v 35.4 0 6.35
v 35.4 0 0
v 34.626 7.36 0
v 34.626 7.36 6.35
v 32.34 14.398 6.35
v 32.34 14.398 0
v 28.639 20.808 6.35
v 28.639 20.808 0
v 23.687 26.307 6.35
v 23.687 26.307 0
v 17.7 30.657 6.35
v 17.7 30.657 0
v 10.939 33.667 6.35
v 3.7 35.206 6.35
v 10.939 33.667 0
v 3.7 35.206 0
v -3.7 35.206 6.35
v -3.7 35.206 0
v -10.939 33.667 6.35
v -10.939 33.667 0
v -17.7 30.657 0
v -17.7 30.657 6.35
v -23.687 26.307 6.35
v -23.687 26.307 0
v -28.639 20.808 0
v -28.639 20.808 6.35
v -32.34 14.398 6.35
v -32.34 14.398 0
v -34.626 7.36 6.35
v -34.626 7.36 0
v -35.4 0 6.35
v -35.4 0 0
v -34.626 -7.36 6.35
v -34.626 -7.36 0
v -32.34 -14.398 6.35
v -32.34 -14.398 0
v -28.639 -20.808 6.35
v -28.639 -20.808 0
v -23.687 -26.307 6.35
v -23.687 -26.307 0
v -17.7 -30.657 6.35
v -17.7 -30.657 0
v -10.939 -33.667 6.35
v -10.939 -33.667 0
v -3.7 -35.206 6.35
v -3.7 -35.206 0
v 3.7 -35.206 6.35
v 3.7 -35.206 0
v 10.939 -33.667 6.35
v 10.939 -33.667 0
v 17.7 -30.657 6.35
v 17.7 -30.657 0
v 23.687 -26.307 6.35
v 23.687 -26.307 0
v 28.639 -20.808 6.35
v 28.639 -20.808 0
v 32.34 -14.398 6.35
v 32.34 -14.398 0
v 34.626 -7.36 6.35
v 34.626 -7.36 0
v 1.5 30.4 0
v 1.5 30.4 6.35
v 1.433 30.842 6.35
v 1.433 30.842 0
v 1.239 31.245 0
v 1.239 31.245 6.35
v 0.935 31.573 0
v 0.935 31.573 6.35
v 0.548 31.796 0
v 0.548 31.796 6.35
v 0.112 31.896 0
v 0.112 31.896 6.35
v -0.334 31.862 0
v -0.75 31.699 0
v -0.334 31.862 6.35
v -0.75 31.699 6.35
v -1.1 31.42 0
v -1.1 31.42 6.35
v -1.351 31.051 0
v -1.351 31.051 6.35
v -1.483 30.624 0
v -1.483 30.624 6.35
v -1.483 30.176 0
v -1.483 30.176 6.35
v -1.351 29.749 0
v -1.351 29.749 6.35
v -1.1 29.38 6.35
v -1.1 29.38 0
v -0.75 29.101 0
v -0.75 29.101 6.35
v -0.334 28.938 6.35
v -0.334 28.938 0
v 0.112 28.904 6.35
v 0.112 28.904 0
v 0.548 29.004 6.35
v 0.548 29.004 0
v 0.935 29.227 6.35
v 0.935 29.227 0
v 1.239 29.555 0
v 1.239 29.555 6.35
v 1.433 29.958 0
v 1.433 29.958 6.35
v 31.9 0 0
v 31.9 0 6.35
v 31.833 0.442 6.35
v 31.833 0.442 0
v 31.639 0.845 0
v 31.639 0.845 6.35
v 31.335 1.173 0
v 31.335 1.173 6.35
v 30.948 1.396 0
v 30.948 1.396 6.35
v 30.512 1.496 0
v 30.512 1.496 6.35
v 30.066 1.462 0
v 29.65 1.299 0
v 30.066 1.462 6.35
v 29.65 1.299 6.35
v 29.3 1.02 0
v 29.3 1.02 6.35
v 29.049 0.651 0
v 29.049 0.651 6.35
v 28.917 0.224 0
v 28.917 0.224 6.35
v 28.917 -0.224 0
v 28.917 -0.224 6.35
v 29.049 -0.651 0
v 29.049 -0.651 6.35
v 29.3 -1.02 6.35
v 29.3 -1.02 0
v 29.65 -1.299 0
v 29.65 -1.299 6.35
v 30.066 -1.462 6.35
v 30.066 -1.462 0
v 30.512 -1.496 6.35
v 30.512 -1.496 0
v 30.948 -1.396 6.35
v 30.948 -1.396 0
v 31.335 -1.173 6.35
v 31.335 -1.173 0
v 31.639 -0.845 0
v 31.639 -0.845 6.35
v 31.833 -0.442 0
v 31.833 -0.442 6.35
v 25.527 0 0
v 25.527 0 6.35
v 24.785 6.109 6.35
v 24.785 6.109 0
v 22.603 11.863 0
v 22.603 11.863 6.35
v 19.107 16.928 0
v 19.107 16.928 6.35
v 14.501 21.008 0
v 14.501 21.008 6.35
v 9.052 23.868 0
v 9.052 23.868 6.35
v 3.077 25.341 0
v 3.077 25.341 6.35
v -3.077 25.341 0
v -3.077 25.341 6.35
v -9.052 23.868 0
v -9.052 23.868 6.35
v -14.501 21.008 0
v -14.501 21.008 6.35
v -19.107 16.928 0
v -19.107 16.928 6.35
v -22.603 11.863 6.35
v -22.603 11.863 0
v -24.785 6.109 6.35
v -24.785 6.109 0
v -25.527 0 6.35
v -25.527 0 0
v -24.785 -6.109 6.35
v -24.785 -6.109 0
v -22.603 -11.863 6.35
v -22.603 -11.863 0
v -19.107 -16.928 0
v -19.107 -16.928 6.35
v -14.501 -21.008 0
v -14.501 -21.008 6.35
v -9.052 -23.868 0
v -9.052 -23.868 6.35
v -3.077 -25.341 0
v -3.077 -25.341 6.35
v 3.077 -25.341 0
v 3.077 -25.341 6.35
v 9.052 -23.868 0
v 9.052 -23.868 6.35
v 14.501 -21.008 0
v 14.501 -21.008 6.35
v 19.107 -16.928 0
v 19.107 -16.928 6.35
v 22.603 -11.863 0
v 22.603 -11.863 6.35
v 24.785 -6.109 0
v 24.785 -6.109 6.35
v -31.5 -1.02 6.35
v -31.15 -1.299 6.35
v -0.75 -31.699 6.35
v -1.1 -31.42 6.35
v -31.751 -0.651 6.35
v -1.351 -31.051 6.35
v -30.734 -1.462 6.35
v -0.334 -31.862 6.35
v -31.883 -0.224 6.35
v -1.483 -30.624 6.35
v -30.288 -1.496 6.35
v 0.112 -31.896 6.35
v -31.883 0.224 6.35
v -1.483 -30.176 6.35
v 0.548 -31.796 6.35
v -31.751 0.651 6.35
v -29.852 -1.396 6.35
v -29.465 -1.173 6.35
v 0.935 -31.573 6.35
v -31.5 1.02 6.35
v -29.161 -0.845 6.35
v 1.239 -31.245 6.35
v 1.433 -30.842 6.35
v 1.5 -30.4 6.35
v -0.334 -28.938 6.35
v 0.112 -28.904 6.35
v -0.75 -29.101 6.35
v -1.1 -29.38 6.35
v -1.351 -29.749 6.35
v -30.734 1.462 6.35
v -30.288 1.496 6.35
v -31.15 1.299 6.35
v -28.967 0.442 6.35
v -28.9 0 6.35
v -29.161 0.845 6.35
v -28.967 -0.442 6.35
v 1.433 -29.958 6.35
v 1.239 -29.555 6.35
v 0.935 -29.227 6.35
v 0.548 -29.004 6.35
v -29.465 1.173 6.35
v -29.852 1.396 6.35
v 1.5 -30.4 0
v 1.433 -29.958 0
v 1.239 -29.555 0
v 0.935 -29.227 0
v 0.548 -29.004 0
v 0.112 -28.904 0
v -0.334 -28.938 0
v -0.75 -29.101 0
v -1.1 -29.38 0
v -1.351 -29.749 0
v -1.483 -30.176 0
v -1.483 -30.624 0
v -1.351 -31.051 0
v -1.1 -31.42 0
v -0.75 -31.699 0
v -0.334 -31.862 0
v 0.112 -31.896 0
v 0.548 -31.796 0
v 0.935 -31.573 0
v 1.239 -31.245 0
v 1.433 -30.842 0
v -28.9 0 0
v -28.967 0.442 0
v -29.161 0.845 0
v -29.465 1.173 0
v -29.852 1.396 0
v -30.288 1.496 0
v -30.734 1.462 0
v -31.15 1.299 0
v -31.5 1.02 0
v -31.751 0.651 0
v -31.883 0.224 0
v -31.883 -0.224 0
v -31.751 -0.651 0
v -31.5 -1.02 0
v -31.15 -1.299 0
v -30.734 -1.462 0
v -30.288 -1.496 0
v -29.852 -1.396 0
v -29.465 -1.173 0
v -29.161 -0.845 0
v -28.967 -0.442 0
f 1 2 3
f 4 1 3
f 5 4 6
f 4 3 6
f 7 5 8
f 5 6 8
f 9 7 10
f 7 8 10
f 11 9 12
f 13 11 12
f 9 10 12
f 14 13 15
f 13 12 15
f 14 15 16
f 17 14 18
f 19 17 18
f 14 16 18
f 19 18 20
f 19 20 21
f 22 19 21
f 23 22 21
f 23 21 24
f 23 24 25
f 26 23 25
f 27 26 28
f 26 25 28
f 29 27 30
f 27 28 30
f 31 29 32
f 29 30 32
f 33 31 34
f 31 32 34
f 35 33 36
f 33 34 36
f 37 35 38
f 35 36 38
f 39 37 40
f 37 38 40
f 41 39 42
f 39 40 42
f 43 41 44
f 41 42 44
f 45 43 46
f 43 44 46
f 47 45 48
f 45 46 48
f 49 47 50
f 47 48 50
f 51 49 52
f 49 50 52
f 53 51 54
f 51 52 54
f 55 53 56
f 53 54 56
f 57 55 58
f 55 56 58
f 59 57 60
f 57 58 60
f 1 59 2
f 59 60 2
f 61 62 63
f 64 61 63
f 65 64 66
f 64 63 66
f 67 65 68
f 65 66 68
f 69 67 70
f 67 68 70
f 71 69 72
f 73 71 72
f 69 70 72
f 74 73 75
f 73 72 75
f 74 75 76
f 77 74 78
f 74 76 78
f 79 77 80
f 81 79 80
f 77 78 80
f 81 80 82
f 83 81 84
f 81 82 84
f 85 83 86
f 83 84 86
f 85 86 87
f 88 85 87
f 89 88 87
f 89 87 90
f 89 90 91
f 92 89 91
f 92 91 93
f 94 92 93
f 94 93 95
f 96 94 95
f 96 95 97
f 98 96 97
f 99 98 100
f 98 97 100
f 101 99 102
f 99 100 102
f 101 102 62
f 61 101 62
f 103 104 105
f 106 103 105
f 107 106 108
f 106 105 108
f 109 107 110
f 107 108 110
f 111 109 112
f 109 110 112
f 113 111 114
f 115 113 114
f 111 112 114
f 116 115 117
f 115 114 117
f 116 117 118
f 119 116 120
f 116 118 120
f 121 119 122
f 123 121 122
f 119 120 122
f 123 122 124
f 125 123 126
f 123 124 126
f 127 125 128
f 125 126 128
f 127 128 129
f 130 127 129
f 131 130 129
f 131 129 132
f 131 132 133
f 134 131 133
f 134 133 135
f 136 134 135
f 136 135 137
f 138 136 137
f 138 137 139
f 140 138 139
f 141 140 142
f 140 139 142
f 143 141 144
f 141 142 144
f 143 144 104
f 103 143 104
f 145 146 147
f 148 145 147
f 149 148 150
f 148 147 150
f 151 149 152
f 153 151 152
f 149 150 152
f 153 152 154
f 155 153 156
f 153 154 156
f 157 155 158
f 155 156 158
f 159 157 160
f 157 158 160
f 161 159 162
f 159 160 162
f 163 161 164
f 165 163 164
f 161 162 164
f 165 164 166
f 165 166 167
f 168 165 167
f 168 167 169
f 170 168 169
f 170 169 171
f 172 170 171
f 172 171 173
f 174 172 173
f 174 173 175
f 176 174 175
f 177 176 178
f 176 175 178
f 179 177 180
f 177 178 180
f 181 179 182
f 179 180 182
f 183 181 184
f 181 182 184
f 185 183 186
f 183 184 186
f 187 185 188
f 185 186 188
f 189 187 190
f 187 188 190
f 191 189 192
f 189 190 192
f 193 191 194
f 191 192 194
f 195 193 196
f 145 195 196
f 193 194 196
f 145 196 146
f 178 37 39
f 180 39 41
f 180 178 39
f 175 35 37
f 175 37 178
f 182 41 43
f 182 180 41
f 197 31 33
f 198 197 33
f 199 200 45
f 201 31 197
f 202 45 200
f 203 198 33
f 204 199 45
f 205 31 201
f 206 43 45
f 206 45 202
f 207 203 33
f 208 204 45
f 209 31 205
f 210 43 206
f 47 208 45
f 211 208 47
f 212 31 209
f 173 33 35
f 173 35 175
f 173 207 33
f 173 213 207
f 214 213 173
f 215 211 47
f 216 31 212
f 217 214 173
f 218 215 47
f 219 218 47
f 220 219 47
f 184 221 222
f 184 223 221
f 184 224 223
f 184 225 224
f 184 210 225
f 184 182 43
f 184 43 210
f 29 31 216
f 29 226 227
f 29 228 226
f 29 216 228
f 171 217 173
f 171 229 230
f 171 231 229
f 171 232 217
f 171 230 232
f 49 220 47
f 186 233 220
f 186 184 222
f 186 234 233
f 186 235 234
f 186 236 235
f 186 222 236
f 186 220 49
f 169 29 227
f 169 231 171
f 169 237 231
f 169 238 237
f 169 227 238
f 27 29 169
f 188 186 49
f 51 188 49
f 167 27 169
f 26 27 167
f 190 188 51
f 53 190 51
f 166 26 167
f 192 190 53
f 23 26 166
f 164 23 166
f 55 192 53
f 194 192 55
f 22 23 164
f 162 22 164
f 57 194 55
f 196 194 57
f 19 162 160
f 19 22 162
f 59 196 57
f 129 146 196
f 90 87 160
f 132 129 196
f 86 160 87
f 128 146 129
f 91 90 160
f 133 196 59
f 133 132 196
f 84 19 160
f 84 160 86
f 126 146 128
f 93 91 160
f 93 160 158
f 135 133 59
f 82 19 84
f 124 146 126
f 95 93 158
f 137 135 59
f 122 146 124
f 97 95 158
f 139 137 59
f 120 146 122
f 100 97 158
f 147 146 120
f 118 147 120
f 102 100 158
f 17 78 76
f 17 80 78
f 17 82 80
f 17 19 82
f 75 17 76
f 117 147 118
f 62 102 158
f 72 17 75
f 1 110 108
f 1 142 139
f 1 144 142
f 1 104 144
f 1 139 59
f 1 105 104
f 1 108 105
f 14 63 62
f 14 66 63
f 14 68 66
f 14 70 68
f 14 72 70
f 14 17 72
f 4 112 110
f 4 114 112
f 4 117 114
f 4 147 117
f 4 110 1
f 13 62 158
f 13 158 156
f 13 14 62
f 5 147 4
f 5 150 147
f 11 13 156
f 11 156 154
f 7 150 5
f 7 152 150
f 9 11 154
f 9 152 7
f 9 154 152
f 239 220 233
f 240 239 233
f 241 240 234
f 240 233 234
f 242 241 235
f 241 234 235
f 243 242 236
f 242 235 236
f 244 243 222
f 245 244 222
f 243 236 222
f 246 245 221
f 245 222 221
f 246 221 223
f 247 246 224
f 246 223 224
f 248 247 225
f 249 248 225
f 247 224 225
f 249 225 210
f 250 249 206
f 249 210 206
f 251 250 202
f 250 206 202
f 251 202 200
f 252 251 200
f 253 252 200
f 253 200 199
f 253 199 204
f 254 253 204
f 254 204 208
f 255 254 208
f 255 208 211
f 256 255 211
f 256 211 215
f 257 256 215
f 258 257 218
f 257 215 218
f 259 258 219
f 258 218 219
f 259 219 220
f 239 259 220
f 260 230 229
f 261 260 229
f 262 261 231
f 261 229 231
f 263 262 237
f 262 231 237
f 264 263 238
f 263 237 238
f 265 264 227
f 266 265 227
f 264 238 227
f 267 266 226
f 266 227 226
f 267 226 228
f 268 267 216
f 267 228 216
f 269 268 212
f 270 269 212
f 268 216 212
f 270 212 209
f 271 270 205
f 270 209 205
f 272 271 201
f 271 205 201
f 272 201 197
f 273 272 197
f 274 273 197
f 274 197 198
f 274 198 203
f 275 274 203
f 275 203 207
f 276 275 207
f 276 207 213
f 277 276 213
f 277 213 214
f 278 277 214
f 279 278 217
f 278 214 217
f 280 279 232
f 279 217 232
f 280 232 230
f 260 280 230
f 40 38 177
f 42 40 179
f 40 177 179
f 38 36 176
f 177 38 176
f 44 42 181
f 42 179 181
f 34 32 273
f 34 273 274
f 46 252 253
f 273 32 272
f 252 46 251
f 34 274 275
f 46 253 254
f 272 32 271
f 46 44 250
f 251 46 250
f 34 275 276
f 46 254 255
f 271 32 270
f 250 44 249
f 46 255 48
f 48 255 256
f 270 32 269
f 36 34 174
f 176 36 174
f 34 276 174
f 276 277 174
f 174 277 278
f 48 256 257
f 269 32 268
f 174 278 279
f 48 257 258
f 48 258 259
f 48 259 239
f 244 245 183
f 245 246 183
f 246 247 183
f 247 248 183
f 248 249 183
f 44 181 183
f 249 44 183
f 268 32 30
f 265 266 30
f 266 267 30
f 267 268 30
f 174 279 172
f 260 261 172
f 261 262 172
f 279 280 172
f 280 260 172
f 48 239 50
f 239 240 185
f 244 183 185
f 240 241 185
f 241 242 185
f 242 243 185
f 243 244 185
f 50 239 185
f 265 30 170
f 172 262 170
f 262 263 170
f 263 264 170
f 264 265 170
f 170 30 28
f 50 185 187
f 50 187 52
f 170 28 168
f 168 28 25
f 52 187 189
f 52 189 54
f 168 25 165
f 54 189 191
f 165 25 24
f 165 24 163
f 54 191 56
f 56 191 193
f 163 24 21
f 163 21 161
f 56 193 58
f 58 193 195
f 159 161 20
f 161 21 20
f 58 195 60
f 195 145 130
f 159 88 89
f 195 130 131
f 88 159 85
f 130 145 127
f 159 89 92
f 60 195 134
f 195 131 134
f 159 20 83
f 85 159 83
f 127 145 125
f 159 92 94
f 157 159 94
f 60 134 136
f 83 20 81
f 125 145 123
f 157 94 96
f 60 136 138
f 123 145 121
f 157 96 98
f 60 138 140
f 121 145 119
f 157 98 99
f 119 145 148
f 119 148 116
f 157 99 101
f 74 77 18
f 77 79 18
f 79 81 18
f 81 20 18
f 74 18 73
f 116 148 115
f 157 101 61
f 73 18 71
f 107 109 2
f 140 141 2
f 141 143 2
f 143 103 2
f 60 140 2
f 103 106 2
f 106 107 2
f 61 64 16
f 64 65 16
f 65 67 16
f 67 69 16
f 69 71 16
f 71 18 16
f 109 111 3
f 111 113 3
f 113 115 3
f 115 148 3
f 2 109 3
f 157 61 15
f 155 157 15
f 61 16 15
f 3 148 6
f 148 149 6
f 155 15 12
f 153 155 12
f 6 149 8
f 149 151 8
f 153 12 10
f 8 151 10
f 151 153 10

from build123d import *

# Parameters (mm, degrees)
SKETCH1_R           = 35.399999939
BOSS_EXTRUDE1_DEPTH = 6.35
SKETCH2_R           = 25.527
CUT_EXTRUDE1_DEPTH  = 6.35
SKETCH5_R           = 1.5
CUT_EXTRUDE2_DEPTH  = 6.35


with BuildPart() as part:
    # Sketch1 → Boss-Extrude1 (new body)
    with BuildSketch(Plane.XY):
        Circle(SKETCH1_R)
    extrude(amount=BOSS_EXTRUDE1_DEPTH)

    # Sketch2 → Cut-Extrude1 (cut)
    with BuildSketch(Plane.XY.offset(6.35)):
        Circle(SKETCH2_R)
    extrude(amount=-CUT_EXTRUDE1_DEPTH, mode=Mode.SUBTRACT)

    # Sketch5 → Cut-Extrude2 (cut)
    with BuildSketch(Plane.XY.offset(6.35)):
        with Locations((0, 30.400000033)):
            Circle(SKETCH5_R)
        with Locations((30.400000033, 0)):
            Circle(SKETCH5_R)
        with Locations((0, -30.400000033)):
            Circle(SKETCH5_R)
        with Locations((-30.400000033, 0)):
            Circle(SKETCH5_R)
    extrude(amount=-CUT_EXTRUDE2_DEPTH, mode=Mode.SUBTRACT)


solid = part.part
